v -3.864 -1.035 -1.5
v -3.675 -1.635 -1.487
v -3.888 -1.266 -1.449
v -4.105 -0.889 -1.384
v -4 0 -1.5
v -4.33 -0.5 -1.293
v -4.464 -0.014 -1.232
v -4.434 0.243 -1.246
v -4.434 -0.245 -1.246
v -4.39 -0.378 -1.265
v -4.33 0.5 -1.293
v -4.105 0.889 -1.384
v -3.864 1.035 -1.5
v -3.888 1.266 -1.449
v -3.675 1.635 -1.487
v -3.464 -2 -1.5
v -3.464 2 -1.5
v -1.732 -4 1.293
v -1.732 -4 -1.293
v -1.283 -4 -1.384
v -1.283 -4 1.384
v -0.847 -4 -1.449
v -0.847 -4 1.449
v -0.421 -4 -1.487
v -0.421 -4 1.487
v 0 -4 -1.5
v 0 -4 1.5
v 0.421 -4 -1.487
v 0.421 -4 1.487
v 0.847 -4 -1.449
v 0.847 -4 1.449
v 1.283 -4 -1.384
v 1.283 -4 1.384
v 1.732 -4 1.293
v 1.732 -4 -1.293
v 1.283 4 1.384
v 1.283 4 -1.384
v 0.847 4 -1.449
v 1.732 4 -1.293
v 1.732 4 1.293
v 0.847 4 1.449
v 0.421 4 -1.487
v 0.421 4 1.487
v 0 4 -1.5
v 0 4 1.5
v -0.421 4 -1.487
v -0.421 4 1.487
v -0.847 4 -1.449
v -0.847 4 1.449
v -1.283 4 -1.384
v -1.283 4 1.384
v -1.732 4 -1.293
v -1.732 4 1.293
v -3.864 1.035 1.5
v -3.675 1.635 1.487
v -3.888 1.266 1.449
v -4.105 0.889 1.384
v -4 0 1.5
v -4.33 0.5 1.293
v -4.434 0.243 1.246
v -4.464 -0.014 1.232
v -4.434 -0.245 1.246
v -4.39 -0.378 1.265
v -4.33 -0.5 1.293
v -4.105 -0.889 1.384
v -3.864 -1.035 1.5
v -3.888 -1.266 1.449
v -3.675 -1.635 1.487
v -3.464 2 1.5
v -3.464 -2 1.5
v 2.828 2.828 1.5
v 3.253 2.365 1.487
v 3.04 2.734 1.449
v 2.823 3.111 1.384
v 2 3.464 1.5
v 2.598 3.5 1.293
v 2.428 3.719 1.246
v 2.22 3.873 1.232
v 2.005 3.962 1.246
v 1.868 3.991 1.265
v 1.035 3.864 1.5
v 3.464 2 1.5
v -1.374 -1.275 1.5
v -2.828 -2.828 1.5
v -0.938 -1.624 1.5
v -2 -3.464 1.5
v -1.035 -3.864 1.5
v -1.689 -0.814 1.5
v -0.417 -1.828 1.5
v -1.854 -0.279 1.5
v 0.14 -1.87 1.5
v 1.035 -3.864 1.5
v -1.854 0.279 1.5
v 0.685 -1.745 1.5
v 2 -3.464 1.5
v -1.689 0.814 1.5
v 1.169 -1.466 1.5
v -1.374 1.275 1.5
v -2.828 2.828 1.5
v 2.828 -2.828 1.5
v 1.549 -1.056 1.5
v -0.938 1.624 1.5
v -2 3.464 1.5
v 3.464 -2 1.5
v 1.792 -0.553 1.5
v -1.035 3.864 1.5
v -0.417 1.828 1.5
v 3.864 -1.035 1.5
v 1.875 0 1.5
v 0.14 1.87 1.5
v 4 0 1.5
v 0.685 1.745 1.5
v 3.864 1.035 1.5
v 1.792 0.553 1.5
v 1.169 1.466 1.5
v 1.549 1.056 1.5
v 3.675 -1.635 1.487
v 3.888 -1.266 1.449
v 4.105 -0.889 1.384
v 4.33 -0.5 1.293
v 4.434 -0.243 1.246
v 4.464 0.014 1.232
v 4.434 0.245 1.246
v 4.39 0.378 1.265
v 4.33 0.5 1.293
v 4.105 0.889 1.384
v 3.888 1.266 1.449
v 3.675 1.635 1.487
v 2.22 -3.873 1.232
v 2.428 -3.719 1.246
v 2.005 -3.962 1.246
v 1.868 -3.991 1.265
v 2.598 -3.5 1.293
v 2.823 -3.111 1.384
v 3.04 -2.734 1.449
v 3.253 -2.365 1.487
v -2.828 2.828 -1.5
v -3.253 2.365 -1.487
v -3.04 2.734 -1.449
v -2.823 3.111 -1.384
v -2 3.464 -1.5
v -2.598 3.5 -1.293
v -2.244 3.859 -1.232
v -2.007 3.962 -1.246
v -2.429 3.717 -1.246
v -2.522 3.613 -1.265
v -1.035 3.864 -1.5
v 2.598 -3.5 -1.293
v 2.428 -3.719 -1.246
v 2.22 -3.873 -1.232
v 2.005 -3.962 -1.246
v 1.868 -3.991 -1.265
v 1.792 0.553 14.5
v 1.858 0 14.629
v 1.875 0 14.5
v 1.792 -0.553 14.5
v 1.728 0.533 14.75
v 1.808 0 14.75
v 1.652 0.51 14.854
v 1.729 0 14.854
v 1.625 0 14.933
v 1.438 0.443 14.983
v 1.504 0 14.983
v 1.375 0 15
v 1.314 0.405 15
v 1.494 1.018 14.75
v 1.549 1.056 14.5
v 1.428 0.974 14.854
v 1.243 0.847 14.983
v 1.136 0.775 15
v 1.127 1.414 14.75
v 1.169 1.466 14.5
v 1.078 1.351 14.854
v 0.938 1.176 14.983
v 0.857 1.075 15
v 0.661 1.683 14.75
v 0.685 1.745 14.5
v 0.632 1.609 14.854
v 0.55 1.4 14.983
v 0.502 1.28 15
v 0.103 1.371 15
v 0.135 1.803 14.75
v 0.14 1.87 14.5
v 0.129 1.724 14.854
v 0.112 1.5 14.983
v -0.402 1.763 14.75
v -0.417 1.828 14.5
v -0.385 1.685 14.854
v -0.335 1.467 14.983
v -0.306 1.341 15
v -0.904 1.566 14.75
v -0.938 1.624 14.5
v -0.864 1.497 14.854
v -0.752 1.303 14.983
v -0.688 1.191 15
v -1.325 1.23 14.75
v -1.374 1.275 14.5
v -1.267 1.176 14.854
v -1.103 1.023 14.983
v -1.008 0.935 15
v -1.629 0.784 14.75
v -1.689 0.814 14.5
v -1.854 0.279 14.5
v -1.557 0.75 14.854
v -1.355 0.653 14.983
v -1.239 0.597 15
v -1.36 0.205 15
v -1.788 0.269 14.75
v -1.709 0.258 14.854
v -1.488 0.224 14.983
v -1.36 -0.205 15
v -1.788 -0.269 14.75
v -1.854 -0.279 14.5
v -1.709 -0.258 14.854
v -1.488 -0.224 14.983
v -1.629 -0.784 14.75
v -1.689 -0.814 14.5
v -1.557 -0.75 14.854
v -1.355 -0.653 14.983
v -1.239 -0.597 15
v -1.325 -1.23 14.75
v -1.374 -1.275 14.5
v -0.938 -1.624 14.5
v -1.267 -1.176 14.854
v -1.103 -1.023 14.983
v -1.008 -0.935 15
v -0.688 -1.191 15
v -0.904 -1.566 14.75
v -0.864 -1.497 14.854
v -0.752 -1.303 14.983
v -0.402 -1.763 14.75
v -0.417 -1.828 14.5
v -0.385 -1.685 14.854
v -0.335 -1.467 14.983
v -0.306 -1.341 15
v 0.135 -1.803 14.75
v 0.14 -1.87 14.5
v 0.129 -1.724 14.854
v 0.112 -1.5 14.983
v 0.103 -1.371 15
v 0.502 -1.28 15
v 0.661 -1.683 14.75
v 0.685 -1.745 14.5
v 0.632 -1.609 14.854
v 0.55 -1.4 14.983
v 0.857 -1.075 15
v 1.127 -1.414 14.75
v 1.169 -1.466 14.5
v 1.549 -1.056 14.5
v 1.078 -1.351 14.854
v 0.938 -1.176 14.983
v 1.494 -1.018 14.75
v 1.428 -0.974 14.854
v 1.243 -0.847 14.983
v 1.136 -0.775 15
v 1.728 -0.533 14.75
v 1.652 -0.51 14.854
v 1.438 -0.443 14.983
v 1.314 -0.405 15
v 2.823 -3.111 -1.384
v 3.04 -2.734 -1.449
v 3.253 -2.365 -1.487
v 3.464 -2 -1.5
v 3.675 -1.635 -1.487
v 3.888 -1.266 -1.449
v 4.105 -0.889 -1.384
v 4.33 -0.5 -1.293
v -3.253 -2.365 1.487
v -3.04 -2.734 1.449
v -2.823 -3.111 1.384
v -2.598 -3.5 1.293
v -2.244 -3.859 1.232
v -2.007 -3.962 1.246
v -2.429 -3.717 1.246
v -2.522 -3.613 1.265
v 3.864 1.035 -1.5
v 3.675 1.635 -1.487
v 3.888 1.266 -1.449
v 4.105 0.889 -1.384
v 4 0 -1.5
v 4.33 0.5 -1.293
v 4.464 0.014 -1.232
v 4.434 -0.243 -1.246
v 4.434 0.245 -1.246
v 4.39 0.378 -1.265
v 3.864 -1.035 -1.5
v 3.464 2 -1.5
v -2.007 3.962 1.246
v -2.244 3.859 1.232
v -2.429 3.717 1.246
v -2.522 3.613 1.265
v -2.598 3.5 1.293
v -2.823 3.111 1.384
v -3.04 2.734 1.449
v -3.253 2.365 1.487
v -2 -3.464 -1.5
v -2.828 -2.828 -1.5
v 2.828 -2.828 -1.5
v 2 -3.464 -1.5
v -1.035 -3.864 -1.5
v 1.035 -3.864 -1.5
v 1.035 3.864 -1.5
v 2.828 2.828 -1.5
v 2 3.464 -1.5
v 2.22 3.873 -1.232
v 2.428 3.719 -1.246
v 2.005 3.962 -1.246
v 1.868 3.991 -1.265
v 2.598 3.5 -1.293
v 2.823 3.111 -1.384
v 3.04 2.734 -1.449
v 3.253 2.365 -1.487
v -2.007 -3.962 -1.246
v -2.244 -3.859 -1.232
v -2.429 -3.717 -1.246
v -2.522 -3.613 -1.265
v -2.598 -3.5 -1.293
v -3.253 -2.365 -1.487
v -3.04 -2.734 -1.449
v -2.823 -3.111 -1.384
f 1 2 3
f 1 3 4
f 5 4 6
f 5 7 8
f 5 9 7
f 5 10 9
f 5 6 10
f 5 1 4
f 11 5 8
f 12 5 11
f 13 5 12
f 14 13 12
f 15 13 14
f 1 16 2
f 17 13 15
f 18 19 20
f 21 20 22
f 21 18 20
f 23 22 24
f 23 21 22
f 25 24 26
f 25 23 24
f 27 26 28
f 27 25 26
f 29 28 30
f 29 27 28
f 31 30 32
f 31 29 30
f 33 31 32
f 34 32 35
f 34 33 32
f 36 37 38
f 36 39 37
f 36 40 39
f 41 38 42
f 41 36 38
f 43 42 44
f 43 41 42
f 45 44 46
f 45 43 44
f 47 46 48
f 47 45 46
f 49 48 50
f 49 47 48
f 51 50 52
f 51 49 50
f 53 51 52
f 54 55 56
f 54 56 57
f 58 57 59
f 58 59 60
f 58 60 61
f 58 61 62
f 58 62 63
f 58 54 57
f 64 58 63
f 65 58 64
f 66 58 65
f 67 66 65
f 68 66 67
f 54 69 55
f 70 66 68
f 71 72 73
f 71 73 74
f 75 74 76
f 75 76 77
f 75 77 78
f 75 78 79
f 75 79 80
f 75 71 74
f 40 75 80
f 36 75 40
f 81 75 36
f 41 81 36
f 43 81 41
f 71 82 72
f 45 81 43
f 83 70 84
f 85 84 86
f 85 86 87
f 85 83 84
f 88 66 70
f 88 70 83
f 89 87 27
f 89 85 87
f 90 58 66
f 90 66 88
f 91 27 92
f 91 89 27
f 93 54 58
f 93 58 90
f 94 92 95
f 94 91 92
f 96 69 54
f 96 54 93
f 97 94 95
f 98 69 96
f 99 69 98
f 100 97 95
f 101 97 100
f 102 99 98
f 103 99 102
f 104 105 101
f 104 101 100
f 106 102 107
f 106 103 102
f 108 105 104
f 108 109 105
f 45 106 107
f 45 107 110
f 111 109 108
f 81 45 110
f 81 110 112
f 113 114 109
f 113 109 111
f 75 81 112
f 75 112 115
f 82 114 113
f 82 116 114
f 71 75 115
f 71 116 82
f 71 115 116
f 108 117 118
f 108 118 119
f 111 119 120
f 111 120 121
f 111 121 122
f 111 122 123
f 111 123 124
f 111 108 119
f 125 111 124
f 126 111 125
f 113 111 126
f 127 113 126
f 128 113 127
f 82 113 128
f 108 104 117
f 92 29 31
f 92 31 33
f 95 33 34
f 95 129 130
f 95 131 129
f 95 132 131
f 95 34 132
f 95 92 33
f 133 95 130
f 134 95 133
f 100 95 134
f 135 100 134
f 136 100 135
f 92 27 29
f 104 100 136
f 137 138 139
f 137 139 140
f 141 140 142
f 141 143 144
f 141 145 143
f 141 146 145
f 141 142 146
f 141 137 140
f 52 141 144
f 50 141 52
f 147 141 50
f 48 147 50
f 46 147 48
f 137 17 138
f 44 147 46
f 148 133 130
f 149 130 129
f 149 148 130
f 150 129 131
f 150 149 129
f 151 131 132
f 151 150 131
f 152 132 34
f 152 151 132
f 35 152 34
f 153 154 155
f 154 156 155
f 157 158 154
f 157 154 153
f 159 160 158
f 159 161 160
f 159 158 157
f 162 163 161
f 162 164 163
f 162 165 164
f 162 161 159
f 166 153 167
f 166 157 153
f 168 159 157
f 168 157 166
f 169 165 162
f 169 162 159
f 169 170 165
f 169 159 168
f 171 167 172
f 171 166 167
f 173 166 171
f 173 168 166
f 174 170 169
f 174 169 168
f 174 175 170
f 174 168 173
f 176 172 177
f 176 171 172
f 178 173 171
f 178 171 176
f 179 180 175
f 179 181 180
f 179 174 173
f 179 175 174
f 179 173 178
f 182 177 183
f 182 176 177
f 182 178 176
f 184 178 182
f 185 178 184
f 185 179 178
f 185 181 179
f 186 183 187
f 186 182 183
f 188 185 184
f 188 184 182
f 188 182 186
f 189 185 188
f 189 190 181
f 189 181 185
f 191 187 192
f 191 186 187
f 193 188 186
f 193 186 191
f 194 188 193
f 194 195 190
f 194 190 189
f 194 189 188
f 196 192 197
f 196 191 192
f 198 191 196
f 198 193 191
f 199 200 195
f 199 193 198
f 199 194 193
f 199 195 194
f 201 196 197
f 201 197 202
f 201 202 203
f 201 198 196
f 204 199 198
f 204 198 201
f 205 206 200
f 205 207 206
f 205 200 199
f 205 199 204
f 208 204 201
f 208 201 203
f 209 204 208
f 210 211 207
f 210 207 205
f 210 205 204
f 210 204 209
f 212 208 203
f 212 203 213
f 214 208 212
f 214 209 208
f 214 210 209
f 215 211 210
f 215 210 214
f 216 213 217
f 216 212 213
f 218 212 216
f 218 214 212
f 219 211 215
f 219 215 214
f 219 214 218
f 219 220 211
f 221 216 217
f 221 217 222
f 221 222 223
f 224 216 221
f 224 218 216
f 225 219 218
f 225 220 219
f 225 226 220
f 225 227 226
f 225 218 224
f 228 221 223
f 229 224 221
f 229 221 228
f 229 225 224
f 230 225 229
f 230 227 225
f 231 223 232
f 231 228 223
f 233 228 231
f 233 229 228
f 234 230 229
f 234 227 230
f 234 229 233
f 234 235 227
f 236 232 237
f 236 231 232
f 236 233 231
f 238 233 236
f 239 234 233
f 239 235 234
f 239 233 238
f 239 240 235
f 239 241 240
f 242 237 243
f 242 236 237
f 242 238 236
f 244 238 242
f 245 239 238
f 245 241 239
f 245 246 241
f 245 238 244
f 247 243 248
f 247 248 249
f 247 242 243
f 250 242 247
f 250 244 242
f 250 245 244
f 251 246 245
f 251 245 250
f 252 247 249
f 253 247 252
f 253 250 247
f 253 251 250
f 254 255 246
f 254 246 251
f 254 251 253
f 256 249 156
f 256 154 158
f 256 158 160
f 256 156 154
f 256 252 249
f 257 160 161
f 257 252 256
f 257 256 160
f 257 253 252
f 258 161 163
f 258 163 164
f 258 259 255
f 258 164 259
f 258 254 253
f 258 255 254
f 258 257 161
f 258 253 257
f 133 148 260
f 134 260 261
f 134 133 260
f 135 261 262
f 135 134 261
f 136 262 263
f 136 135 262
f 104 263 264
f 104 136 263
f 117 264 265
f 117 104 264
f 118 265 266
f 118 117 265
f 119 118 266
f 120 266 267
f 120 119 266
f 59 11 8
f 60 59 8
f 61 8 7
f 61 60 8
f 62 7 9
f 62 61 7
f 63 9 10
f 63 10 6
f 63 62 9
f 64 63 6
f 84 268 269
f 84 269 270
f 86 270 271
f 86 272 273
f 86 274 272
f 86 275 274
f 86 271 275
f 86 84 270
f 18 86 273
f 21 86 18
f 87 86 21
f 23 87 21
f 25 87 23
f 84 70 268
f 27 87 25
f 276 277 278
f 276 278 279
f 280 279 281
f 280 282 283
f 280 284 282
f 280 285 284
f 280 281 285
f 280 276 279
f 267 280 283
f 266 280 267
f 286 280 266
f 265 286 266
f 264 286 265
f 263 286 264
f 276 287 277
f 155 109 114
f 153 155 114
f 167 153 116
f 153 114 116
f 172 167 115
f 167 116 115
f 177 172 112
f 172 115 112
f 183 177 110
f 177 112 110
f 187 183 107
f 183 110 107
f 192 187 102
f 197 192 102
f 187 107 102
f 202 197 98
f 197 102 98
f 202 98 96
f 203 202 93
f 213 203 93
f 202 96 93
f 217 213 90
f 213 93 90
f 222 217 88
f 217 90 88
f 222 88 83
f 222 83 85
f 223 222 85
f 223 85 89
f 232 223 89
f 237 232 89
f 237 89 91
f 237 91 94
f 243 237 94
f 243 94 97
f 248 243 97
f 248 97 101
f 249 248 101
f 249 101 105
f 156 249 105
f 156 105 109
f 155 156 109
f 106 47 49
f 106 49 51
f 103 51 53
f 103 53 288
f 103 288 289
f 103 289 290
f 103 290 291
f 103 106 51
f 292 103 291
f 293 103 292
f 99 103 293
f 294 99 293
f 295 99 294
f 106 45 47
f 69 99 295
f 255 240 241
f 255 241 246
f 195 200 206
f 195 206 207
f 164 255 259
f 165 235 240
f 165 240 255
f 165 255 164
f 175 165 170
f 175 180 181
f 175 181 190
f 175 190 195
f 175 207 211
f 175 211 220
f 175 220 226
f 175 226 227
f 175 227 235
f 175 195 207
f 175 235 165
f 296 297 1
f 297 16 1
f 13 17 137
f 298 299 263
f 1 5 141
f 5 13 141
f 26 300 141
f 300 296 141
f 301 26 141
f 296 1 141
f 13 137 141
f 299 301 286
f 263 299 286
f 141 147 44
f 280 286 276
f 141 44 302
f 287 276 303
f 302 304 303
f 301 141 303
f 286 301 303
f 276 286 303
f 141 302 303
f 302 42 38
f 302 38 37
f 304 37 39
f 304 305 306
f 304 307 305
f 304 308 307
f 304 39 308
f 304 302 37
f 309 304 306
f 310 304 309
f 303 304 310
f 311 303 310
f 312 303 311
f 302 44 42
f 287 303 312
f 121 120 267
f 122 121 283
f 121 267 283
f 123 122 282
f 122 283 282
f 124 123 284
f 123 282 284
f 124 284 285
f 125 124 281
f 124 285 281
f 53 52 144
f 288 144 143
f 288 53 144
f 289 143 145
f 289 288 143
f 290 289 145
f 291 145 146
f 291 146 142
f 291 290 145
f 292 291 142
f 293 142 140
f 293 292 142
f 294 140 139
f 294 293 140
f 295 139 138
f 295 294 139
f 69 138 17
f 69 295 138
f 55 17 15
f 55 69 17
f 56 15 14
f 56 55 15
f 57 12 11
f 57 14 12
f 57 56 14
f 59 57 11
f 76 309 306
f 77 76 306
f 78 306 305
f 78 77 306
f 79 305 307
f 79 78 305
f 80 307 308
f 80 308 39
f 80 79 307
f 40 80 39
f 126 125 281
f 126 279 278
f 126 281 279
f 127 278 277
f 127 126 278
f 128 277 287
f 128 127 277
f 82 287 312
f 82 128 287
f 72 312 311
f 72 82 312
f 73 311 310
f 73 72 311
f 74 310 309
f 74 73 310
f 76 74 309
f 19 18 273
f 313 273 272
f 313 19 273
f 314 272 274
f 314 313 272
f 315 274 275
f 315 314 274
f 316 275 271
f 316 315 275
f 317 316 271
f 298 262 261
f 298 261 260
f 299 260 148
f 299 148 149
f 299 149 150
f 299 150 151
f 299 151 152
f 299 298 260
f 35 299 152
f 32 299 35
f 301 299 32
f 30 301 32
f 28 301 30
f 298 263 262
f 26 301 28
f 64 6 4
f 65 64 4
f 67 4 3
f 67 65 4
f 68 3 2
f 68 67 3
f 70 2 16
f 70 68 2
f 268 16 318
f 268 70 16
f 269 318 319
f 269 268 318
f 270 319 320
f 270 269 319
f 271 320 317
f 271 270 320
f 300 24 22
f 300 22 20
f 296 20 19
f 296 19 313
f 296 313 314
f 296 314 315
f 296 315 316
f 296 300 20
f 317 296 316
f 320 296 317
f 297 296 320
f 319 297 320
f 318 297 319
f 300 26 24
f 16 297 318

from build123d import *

# Parameters (mm, degrees)
BOSS_EXTRUDE2_DEPTH     = 1.5
SKETCH5_OUTSIDE_W       = 65.716
SKETCH5_OUTSIDE_H       = 64.478
SKETCH5_OUTSIDE_R       = 4
CUT_EXTRUDE1_DEPTH      = 15
CUT_EXTRUDE1_DRAFT      = -60
MIRROR1_COPY_1_SKETCH_W = 65.716
MIRROR1_COPY_1_SKETCH_H = 64.478
MIRROR1_COPY_1_SKETCH_R = 4
MIRROR1_COPY_1_DEPTH    = 15
MIRROR1_COPY_1_DRAFT    = -60
SKETCH4_3_R             = 1.875
BOSS_EXTRUDE3_DEPTH     = 15
FILLET1_R               = 1
FILLET2_R               = 0.5


with BuildPart() as part:
    # Sketch4 → Boss-Extrude2 (new, symmetric)
    with BuildSketch(Plane.XY):
        Polygon((2.309401077, 4), (-2.309401077, 4), (-4.618802154, 0), (-2.309401077, -4), (2.309401077, -4), (4.618802154, 0), align=None)
    extrude(amount=BOSS_EXTRUDE2_DEPTH, both=True)


with BuildPart() as cut_extrude1_tool:
    # Sketch5 outside → Cut-Extrude1 (with draft: the straight prism first)
    with BuildSketch(Plane.XY.offset(1.5)):
        Rectangle(SKETCH5_OUTSIDE_W, SKETCH5_OUTSIDE_H)
        Circle(SKETCH5_OUTSIDE_R, mode=Mode.SUBTRACT)
    extrude(amount=-CUT_EXTRUDE1_DEPTH)
    # Cut-Extrude1: the draft: its side faces are tilted about the plane it starts from
    cut_extrude1_sides = [cut_extrude1_tool.faces().sort_by_distance(p)[0] for p in [
        (0, -32.239, -6),
        (32.858, 0, -6),
        (0, 32.239, -6),
        (-32.858, 0, -6),
        (-4, 0, -6),
    ]]
    draft(cut_extrude1_sides, Plane.XY.offset(1.5), CUT_EXTRUDE1_DRAFT)


with BuildPart() as part_1:
    add(part.part)

    # Cut-Extrude1: cut by cut_extrude1_tool
    add(cut_extrude1_tool.part, mode=Mode.SUBTRACT)


with BuildPart() as mirror1_copy_1_tool:
    # Mirror1 copy 1 sketch → Mirror1 copy 1 (with draft: the straight prism first)
    with BuildSketch(Plane(origin=(0, 0, -1.5), x_dir=(1, 0, 0), z_dir=(0, 0, -1))):
        Rectangle(MIRROR1_COPY_1_SKETCH_W, MIRROR1_COPY_1_SKETCH_H)
        Circle(MIRROR1_COPY_1_SKETCH_R, mode=Mode.SUBTRACT)
    extrude(amount=-MIRROR1_COPY_1_DEPTH)
    # Mirror1 copy 1: the draft: its side faces are tilted about the plane it starts from
    mirror1_copy_1_sides = [mirror1_copy_1_tool.faces().sort_by_distance(p)[0] for p in [
        (0, -32.239, 6),
        (32.858, 0, 6),
        (0, 32.239, 6),
        (-32.858, 0, 6),
        (-4, 0, 6),
    ]]
    draft(mirror1_copy_1_sides, Plane(origin=(0, 0, -1.5), x_dir=(1, 0, 0), z_dir=(0, 0, -1)), MIRROR1_COPY_1_DRAFT)


with BuildPart() as part_2:
    add(part_1.part)

    # Mirror1 copy 1: cut by mirror1_copy_1_tool
    add(mirror1_copy_1_tool.part, mode=Mode.SUBTRACT)

    # Sketch4<3> → Boss-Extrude3 (add)
    with BuildSketch(Plane.XY):
        Circle(SKETCH4_3_R)
    extrude(amount=BOSS_EXTRUDE3_DEPTH)

    # Fillet1
    fillet1_edges = [part_2.edges().sort_by_distance(p)[0] for p in [
        (4.618802154, 0, 0),
        (2.309401077, -4, 0),
        (-2.309401077, -4, 0),
        (-4.618802154, 0, 0),
        (-2.309401077, 4, 0),
        (2.309401077, 4, 0),
    ]]
    fillet(fillet1_edges, radius=FILLET1_R)

    # Fillet2
    fillet2_edges = [part_2.edges().sort_by_distance(p)[0] for p in [
        (-1.875, 0, 15),
    ]]
    fillet(fillet2_edges, radius=FILLET2_R)


solid = part_2.part
